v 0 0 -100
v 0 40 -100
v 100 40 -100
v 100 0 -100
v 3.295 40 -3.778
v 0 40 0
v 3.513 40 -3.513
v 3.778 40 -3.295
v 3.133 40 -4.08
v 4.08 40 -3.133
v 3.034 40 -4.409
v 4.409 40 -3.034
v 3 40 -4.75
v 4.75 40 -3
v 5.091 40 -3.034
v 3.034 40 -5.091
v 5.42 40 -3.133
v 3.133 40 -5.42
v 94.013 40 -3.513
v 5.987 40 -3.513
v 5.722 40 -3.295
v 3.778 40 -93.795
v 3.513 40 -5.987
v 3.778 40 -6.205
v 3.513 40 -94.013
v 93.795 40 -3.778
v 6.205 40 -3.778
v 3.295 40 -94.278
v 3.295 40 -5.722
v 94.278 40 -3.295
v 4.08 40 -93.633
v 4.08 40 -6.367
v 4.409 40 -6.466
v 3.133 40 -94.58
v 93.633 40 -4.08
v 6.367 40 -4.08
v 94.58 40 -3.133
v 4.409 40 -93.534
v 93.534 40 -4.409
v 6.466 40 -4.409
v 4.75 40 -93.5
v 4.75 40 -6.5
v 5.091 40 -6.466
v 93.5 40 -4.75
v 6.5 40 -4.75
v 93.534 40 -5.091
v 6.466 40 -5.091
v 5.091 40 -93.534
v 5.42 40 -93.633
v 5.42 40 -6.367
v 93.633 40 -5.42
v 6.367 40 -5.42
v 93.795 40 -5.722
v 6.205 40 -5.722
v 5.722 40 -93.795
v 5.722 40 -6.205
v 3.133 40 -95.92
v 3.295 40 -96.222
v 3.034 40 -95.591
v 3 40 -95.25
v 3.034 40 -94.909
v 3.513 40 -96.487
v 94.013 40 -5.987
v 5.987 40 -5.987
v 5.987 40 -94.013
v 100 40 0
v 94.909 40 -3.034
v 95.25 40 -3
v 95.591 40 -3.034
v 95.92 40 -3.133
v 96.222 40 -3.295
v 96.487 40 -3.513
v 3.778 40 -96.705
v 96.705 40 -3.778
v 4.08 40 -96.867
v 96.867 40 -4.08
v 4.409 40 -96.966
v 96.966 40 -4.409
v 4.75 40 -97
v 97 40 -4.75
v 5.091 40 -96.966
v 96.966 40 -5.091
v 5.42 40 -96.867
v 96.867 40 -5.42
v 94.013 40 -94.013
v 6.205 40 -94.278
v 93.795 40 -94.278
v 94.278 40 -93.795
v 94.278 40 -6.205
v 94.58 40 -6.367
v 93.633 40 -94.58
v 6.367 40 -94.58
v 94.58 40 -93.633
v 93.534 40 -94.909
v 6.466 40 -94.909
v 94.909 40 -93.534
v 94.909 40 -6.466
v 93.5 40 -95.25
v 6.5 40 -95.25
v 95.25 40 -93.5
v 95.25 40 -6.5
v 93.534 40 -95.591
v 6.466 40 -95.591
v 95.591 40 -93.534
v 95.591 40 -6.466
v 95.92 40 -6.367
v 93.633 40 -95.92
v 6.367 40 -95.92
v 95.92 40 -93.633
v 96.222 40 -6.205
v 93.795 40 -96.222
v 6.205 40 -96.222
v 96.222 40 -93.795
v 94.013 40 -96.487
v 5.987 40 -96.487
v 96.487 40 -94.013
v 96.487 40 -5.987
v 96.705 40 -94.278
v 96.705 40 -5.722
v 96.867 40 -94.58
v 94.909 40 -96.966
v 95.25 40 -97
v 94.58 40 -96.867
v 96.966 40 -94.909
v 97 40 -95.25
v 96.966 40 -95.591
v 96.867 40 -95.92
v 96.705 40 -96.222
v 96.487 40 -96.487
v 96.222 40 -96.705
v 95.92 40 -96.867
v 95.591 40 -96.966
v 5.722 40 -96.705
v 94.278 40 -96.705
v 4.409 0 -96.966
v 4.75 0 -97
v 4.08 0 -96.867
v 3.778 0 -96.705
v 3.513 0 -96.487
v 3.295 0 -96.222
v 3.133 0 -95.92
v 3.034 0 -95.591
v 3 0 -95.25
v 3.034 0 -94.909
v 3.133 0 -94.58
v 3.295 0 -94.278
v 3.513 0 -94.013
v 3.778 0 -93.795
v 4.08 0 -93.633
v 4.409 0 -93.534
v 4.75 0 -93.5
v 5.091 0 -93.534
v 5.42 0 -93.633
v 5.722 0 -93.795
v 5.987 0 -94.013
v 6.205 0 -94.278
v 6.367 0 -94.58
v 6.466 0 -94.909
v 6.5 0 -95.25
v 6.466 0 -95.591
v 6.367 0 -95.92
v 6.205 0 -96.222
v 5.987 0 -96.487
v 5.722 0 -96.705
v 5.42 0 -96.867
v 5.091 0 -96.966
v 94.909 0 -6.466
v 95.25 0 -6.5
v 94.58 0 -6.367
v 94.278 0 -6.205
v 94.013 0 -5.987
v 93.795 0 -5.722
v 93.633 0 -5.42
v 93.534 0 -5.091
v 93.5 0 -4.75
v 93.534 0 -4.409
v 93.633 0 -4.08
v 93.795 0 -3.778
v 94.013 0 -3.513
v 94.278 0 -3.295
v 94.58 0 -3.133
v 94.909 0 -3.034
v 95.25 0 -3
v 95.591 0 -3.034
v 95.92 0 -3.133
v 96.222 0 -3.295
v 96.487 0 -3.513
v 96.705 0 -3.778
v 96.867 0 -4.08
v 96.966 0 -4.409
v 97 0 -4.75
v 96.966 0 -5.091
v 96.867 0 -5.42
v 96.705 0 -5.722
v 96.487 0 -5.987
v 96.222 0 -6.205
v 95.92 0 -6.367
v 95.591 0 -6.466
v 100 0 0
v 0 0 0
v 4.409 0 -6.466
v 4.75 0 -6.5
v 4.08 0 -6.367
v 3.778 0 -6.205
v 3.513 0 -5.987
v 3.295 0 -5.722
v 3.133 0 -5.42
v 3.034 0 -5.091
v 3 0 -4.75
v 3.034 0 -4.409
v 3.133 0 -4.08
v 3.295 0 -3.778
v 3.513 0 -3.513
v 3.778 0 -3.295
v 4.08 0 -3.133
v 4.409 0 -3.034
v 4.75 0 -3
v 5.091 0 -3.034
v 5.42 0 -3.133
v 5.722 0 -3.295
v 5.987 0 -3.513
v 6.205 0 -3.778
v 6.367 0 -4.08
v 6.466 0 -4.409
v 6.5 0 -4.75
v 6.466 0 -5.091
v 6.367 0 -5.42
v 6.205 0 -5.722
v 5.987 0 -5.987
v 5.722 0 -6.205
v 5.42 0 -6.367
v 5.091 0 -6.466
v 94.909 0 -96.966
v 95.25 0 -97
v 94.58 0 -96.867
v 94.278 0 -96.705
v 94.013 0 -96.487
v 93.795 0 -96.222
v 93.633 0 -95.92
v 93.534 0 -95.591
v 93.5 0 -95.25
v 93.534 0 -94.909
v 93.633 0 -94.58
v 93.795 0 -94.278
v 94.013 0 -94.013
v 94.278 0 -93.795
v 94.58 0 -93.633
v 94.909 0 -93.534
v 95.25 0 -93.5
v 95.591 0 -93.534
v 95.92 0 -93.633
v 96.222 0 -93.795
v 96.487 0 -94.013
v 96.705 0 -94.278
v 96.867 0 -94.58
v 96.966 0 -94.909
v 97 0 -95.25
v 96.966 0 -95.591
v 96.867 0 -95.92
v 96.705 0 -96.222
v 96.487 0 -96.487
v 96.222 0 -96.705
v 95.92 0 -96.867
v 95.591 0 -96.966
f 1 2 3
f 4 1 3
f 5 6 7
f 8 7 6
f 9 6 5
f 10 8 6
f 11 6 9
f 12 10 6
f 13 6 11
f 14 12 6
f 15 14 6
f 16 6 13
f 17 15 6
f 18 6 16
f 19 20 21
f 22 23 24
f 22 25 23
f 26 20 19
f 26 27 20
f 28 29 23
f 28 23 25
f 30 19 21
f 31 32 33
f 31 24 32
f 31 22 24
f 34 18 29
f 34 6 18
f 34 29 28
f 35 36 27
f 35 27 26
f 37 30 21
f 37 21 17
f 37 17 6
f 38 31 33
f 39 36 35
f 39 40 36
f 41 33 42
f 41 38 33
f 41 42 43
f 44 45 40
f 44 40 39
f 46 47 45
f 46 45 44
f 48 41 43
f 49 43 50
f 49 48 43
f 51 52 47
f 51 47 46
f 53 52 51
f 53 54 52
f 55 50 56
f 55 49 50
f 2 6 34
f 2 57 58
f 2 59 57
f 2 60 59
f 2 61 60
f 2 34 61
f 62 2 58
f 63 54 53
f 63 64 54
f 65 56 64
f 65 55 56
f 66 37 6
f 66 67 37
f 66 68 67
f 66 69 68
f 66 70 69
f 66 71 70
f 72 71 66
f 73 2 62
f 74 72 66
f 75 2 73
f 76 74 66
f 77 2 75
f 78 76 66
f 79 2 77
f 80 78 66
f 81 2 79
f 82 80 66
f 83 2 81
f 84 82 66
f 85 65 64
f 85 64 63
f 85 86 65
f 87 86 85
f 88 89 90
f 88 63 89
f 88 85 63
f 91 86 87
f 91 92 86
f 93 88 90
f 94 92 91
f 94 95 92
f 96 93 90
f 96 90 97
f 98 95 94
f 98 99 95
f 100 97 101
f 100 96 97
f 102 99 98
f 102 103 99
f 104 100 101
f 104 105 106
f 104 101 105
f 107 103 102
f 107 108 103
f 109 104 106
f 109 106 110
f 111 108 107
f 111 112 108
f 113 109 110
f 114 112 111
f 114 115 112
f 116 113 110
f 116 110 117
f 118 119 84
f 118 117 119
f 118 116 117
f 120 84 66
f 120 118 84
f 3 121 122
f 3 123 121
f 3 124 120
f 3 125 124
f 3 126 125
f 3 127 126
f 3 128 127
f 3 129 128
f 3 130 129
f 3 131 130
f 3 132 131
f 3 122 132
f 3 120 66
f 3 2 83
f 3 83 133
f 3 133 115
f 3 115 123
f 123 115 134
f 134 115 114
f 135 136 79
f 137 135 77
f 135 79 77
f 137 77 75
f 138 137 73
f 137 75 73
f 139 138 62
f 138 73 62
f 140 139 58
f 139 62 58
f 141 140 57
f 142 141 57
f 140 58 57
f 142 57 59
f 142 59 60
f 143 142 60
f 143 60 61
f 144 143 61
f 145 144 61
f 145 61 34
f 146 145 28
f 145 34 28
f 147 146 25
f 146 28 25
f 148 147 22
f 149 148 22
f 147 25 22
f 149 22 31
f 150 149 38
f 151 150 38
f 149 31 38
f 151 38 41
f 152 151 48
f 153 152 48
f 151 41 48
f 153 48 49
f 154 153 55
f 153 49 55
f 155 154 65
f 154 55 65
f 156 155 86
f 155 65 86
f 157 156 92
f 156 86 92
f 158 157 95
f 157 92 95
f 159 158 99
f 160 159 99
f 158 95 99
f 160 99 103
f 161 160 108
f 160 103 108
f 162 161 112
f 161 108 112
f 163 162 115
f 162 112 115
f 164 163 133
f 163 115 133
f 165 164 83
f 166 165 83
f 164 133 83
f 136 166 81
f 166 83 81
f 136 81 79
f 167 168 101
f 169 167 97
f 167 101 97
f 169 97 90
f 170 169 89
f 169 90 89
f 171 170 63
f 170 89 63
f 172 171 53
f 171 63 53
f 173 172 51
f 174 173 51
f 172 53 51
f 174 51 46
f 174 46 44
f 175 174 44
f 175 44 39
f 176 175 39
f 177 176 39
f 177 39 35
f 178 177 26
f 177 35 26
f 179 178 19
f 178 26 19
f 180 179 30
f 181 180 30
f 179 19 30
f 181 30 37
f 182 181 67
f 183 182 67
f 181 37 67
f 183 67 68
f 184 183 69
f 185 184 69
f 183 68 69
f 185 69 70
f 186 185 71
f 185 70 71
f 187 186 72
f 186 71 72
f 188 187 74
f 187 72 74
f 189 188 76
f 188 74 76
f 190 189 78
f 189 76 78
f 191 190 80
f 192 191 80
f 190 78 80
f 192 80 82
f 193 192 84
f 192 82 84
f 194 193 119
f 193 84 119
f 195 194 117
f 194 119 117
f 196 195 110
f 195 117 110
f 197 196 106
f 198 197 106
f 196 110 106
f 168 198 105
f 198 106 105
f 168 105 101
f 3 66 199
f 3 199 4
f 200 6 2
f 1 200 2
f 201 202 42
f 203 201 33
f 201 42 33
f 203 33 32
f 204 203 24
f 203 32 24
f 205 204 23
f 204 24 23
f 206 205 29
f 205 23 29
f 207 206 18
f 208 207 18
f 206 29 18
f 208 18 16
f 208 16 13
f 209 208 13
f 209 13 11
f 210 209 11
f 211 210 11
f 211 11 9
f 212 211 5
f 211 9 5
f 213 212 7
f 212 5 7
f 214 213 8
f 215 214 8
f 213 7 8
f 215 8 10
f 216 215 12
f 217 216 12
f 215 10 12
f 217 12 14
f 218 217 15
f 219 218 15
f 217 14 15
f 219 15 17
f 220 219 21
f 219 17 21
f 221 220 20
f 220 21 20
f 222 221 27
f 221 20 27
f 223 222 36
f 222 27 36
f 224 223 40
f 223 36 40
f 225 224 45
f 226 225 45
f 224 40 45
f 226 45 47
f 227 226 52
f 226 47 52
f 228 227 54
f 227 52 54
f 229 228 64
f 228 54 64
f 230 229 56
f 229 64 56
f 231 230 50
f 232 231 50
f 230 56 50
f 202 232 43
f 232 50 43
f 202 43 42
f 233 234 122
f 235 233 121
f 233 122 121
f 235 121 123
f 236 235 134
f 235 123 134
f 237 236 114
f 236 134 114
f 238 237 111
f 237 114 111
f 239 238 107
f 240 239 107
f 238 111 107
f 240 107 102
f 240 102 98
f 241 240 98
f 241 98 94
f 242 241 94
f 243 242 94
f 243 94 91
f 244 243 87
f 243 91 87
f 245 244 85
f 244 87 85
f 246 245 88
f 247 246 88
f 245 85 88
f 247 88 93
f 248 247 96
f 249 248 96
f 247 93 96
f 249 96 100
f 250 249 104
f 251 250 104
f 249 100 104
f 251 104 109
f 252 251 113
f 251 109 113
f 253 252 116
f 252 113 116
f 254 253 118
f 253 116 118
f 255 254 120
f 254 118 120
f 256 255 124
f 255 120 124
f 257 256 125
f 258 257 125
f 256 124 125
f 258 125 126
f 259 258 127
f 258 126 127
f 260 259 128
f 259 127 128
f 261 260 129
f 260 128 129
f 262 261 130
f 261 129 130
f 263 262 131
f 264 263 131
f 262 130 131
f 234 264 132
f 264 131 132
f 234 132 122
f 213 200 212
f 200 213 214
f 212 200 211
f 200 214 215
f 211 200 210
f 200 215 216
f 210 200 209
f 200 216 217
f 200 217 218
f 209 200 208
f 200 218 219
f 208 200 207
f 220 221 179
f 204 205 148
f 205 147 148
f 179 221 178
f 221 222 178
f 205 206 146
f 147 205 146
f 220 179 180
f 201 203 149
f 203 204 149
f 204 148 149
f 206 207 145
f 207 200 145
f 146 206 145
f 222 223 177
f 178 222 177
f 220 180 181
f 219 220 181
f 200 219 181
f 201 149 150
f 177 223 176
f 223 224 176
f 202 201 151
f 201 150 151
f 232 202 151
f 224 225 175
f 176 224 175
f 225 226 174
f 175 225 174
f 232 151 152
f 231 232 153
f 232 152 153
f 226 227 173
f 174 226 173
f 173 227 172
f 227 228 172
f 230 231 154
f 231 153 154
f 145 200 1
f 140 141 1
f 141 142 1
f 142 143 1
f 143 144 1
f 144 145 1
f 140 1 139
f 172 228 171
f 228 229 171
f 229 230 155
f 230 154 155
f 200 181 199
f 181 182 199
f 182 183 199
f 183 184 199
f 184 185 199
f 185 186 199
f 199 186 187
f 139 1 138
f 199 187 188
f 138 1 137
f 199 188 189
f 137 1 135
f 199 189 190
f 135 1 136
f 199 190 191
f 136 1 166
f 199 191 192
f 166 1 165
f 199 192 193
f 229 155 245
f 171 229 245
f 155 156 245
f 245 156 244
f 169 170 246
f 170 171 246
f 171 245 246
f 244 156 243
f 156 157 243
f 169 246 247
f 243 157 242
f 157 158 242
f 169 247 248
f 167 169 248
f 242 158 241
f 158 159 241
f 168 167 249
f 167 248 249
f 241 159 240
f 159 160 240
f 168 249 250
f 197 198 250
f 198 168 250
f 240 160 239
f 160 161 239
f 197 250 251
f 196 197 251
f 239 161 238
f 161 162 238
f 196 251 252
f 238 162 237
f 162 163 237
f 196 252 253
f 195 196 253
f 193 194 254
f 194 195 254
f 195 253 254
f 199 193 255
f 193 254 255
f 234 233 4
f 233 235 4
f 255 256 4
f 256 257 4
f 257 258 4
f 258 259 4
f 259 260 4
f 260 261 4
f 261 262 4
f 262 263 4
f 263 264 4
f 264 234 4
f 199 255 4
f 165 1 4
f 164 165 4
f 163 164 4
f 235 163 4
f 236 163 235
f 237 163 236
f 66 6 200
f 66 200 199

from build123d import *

# Parameters (mm, degrees)
ESBO_O1_W                = 100
ESBO_O1_H                = 100
ESBO_O1_R                = 1.75
RESSALTO_EXTRUS_O1_DEPTH = 40


with BuildPart() as part:
    # Esboço1 → Ressalto-extrusão1 (new body)
    with BuildSketch(Plane(origin=(0, 40, 0), x_dir=(1, 0, 0), z_dir=(0, 1, 0))):
        with Locations((50, 50)):
            Rectangle(ESBO_O1_W, ESBO_O1_H)
        with Locations(Location((4.75, 95.25, 0), (0, 0, 90))):
            Circle(ESBO_O1_R, mode=Mode.SUBTRACT)
        with Locations(Location((95.25, 95.25, 0), (0, 0, 90))):
            Circle(ESBO_O1_R, mode=Mode.SUBTRACT)
        with Locations(Location((95.25, 4.75, 0), (0, 0, 90))):
            Circle(ESBO_O1_R, mode=Mode.SUBTRACT)
        with Locations(Location((4.75, 4.75, 0), (0, 0, 90))):
            Circle(ESBO_O1_R, mode=Mode.SUBTRACT)
    extrude(amount=-RESSALTO_EXTRUS_O1_DEPTH)


solid = part.part
